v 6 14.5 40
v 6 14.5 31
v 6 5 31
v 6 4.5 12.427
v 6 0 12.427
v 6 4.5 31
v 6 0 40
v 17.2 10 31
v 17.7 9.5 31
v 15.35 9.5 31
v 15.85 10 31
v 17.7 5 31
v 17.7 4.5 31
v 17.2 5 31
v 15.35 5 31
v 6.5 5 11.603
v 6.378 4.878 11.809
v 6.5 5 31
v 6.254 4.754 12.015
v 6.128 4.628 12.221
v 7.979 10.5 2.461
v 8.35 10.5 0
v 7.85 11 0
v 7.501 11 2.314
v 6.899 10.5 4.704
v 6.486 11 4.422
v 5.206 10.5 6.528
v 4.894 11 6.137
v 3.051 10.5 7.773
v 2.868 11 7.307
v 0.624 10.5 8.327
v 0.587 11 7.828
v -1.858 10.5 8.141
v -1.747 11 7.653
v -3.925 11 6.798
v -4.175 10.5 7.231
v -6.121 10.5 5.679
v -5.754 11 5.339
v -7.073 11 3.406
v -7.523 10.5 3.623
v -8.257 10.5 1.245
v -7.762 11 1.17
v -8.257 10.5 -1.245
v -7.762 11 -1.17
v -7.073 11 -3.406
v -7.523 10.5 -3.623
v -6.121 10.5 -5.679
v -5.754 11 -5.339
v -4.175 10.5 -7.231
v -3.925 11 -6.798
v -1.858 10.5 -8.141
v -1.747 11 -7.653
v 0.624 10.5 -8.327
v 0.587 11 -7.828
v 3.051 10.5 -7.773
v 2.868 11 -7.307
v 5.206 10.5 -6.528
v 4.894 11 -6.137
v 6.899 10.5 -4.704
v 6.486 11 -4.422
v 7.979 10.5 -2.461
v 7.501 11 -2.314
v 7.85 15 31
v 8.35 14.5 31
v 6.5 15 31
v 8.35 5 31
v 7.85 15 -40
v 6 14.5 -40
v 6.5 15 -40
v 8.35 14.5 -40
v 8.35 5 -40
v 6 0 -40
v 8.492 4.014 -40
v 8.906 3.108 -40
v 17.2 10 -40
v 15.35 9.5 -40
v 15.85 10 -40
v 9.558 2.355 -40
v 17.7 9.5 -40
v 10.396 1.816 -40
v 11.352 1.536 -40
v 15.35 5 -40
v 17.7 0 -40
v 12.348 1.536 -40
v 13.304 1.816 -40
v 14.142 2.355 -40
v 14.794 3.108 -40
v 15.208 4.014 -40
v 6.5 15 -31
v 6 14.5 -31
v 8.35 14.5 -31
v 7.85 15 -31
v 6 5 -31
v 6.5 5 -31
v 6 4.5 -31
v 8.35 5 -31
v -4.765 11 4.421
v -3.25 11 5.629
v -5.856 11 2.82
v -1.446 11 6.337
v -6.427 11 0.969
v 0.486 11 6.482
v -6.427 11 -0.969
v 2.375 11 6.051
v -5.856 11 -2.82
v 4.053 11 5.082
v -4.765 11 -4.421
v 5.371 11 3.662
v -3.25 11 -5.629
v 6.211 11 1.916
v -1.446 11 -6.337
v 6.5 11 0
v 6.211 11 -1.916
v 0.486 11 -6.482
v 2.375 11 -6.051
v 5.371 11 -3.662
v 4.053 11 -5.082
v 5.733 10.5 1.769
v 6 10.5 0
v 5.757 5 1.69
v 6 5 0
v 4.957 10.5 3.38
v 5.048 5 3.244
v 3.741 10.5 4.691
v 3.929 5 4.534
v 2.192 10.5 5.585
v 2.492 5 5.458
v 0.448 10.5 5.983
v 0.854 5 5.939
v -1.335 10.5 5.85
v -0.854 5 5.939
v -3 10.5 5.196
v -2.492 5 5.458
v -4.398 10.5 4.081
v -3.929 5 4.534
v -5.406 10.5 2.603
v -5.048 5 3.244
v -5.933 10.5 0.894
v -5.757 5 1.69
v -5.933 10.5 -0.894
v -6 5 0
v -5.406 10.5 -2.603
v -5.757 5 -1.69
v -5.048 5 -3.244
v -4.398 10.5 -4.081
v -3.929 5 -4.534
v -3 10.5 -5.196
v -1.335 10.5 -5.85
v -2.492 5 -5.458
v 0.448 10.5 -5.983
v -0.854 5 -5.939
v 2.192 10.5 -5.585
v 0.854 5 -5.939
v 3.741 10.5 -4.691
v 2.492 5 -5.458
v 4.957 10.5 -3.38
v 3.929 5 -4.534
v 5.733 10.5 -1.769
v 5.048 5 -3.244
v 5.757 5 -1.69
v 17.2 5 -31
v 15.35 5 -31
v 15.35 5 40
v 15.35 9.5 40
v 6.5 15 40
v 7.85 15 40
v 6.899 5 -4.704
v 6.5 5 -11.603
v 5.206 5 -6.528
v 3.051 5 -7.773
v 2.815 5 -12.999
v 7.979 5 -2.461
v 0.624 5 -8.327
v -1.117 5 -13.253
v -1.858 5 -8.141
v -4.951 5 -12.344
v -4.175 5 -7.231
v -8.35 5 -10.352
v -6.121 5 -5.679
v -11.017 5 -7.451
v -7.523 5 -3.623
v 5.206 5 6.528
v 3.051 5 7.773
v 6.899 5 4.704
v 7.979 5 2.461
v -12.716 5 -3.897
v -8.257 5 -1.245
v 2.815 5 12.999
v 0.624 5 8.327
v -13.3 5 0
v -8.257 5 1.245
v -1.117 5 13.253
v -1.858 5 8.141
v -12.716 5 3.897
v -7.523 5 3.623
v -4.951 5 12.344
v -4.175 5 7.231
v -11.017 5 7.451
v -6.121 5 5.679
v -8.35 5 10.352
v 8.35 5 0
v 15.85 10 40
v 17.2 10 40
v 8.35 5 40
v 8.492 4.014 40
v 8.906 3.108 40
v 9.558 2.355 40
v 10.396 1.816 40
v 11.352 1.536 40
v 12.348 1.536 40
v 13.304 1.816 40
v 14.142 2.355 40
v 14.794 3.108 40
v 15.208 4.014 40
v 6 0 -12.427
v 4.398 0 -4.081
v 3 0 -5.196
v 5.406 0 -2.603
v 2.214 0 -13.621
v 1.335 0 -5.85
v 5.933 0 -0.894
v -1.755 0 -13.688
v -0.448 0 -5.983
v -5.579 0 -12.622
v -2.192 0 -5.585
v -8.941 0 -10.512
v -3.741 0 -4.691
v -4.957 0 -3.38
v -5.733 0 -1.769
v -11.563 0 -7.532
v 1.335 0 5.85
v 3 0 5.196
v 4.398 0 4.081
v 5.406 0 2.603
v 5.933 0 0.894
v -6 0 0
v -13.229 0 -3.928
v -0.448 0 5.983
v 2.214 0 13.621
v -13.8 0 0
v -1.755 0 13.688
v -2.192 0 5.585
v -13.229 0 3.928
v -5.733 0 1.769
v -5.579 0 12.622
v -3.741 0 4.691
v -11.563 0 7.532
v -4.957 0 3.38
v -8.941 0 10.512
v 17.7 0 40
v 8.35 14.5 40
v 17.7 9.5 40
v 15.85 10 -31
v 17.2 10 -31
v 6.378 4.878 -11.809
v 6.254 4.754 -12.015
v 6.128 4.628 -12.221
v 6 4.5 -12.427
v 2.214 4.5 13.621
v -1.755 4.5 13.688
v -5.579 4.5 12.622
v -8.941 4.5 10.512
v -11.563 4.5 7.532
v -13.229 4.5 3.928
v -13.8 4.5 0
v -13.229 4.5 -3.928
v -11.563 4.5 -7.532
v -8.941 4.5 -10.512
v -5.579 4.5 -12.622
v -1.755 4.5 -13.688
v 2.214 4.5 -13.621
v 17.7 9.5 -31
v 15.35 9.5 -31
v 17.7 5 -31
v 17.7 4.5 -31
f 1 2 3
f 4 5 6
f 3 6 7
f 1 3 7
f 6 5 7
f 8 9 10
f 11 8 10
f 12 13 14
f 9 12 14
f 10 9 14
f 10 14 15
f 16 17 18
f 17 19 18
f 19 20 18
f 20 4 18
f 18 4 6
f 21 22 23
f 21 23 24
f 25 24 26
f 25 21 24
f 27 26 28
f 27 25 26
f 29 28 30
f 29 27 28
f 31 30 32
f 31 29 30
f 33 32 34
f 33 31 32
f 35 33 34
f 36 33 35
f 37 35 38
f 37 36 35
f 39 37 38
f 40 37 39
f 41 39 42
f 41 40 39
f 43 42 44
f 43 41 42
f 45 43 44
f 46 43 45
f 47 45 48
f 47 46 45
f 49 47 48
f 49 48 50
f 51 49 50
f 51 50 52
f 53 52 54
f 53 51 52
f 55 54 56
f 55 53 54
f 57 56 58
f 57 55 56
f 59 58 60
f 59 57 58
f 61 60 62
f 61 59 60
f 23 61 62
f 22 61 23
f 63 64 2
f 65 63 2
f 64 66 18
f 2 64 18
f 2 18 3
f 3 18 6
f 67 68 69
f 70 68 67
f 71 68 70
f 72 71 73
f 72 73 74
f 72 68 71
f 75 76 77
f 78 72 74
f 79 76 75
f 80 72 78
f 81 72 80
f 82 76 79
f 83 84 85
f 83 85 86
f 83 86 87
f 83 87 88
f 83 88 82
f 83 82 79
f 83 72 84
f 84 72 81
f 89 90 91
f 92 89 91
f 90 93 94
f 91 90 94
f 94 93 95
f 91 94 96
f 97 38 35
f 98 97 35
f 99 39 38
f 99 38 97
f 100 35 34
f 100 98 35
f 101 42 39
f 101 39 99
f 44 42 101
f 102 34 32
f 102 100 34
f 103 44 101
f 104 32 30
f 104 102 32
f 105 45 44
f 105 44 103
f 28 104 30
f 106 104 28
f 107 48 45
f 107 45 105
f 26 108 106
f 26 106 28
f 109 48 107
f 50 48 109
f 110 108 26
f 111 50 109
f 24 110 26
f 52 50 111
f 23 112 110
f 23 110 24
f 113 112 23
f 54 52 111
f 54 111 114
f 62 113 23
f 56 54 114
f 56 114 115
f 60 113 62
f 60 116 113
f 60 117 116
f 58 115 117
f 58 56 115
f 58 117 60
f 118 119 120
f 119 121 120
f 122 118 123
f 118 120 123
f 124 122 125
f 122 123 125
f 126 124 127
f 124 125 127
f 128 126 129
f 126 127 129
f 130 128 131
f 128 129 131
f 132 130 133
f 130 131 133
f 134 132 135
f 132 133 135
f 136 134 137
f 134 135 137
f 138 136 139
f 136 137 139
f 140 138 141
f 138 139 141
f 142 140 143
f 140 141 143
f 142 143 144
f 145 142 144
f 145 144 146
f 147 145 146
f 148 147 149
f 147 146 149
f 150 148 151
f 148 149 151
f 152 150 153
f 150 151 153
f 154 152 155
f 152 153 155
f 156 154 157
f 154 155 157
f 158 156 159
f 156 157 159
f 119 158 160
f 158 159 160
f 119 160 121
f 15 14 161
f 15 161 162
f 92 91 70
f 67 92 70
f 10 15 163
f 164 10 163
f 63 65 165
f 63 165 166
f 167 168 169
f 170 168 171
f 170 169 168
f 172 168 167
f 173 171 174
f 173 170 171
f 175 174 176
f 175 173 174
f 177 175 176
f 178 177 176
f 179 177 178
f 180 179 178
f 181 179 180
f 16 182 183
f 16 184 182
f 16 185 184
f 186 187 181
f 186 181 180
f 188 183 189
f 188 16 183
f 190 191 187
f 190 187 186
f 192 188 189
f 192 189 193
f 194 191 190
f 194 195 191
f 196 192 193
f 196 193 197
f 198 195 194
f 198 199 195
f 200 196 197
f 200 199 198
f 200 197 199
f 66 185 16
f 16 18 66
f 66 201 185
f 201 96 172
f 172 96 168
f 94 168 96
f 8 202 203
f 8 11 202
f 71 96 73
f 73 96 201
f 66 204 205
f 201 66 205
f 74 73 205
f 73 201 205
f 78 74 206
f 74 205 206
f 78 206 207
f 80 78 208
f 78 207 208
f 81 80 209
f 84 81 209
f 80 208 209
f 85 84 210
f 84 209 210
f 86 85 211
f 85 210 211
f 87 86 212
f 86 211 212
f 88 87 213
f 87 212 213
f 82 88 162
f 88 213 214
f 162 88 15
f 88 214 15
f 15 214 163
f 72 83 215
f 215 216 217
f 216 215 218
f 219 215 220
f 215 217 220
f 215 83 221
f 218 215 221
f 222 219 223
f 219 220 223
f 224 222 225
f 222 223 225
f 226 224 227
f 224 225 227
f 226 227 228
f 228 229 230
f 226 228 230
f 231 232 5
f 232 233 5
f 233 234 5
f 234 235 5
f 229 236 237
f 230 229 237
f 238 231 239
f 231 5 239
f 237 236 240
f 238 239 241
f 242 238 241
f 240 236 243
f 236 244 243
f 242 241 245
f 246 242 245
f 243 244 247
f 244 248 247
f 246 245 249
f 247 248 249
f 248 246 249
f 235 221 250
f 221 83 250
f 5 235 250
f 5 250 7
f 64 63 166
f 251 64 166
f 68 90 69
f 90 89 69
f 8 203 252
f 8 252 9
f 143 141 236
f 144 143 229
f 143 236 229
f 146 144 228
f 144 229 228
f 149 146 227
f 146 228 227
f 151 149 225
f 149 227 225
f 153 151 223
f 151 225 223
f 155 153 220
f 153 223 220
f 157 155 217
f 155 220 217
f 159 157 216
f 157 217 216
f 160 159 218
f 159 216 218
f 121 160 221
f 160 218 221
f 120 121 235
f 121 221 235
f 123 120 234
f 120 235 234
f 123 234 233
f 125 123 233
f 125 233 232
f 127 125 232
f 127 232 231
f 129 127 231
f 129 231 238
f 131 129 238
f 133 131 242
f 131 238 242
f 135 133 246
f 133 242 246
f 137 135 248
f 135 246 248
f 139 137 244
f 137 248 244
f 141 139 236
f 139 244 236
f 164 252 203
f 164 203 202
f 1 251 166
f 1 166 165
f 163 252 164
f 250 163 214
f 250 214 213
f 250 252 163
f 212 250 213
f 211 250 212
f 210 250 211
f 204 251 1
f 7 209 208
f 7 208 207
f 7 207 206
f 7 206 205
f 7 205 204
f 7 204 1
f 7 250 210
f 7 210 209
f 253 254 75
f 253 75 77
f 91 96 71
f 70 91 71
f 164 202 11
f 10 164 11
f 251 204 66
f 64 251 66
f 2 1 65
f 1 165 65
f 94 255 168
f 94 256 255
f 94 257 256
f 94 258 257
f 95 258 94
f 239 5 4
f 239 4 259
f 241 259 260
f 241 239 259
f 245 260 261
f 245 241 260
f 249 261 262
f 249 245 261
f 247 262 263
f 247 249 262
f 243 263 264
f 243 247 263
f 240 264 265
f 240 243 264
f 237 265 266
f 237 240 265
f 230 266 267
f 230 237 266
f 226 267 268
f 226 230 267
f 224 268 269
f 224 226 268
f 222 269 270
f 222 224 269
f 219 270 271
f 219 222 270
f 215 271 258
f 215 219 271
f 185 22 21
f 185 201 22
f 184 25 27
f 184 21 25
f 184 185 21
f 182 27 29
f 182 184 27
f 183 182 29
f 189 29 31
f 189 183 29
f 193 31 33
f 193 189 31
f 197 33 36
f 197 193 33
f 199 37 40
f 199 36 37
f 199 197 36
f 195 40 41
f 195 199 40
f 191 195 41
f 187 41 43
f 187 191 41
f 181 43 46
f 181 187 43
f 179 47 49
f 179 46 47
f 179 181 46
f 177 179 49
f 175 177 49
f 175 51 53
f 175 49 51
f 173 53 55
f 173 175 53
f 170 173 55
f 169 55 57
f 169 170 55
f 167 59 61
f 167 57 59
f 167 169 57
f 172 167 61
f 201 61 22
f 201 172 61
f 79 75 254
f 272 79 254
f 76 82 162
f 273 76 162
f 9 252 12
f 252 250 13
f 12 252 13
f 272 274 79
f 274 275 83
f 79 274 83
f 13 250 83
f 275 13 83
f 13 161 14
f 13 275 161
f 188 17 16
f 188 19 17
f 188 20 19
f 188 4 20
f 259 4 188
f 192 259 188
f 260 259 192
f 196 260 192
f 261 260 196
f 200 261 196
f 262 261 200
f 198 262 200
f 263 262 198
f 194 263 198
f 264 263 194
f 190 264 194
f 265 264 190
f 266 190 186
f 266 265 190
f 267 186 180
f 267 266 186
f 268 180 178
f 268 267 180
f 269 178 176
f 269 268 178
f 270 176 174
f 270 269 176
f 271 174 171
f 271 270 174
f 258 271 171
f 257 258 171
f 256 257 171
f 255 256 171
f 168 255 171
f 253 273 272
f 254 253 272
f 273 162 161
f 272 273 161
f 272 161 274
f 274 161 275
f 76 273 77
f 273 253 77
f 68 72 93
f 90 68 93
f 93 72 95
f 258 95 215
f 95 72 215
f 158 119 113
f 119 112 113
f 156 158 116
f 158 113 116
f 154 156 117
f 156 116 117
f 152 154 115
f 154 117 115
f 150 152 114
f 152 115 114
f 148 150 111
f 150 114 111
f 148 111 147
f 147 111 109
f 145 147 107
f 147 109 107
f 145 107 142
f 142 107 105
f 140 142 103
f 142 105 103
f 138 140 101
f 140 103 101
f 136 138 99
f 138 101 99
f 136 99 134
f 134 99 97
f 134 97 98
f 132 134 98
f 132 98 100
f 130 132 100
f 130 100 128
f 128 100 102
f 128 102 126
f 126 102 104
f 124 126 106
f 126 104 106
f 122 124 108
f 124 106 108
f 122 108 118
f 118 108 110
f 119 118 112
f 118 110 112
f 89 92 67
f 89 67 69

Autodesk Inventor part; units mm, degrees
ref_plane "YZ Plane" through (0, 0, 0) normal (1, 0, 0) x (0, 1, 0)
ref_plane "XZ Plane" through (0, 0, 0) normal (0, 1, 0) x (-1, 0, 0)
ref_plane "XY Plane" through (0, 0, 0) normal (0, 0, 1) x (1, 0, 0)
sketch "Sketch1" plane through (0, 0, 0) normal (0, 1, 0) x (-1, 0, 0)
  circle A0 centre (0, 0) radius 13.8
  circle A1 centre (0, 0) radius 5
  circle A2 centre (0, 0) radius 6
  dimension "d0" = 27.6
  dimension "d1" = 10
  dimension "d2" = 12
extrude "Extrusion1" add sketch "Sketch1" along normal blind 5 contours A0
sketch "Sketch2" plane through (0, 0, 0) normal (0, -1, 0) x (1, 0, 0)
  circle A0 centre (0, 0) radius 6 projected
  line L0 (6, 0) -> (13.8, 0)
  circle A1 centre (0, 0) radius 13.8 projected
  line L1 (13.8, -40) -> (6, -40)
  line L2 (6, -40) -> (6, 40)
  line L3 (6, 40) -> (13.8, 40)
  line L4 (13.8, 40) -> (13.8, -40)
  line L5 (13.8, -40) -> (6, 40) construction
  line L6 (6, -40) -> (13.8, 40) construction
  line L7 (17.7, 40) -> (9.9, 40)
  line L8 (9.9, 40) -> (9.9, -40)
  line L9 (9.9, -40) -> (17.7, -40)
  line L10 (17.7, -40) -> (17.7, 40)
  line L11 (17.7, 40) -> (9.9, -40) construction
  line L12 (9.9, 40) -> (17.7, -40) construction
  point P0 (9.9, 0)
  point P1 (6, -12.4274)
  point P2 (6, 12.4274)
  dimension "d5" = 80
extrude "Extrusion2" add sketch "Sketch2" against normal blind 5 contours A1 L8 L1 L2 | L2 L3 L8 A1 | L4 L1 L8 A1 | A1 L8 L3 L4 | L4 L7 L10 L9
sketch "Sketch3" plane through (6, 0, 40) normal (0, 0, 1) x (1, 0, 0)
  line L0 (-12, 5) -> (0, 5) projected
  line L1 (7.8, 0) -> (0, 0) projected
  line L2 (0, 5) -> (7.8, 0) construction
  line L3 (0, 5) -> (7.8, 5) construction
  line L4 (0, 0) -> (7.8, 5) construction
  point P0 (-6, 0)
sketch "Sketch4" plane through (6, 0, 40) normal (0, 0, 1) x (1, 0, 0)
  line L0 (0, 0) -> (0, 5) projected
  line L1 (0, 2.5) -> (11.7, 2.5)
  line L2 (11.7, 0) -> (11.7, 5) projected
  line L3 (5.85, 2.5) -> (5.85, 5)
  line L4 (0, 5) -> (11.7, 5) projected
  circle A0 centre (5.85, 5) radius 3.5
  point P0 (-6, 0)
  point P1 (2.35, 5)
  point P2 (9.35, 5)
  dimension "d8" = 7
extrude "Extrusion3" cut sketch "Sketch4" against normal through all contours A0 L4 L3 L1 | L1 A0 | L3 L4 A0 L1
sketch "Sketch5" plane through (0, 5, 0) normal (0, 1, 0) x (1, 0, 0)
  line L0 (17.7, -40) -> (6, -40) projected
  line L1 (8.35, -40) -> (8.35, 40) projected
  line L2 (6, -40) -> (8.35, -40)
  line L3 (8.35, -40) -> (8.35, -31)
  line L4 (8.35, -31) -> (6, -31)
  line L5 (6, -31) -> (6, -40)
  line L6 (15.35, 40) -> (15.35, -40) projected
  line L7 (17.7, -40) -> (17.7, 40) projected
  line L8 (15.35, -40) -> (17.7, -40)
  line L9 (17.7, -40) -> (17.7, -31)
  line L10 (17.7, -31) -> (15.35, -31)
  line L11 (15.35, -31) -> (15.35, -40)
  point P0 (0, 0)
  dimension "d11" = 9
extrude "Extrusion4" add sketch "Sketch5" along normal blind 10 contours L0 L5 L4 L1
extrude "Extrusion5" add sketch "Sketch5" along normal blind 5 contours L0 L6 L10 L7
mirror "Mirror1" about plane through (0, 0, 0) normal (0, 0, 1) of "Extrusion4", "Extrusion5"
sketch "Sketch6" plane through (0, 5, 0) normal (0, 1, 0) x (1, 0, 0)
  circle A0 centre (0, 0) radius 8.35
  circle A1 centre (0, 0) radius 6
extrude "Extrusion6" add sketch "Sketch6" along normal blind 6
chamfer "Chamfer1" distance 0.5 angle 45 14 edges at (-8.35, 11, 0) (-6, 11, 0) (-13.8, 5, 0) (6, 5, -21.7137) (6, 5, 21.7137) (8.35, 15, 35.5) (6, 15, 35.5) (8.35, 15, -35.5) (6, 15, -35.5) (17.7, 10, -35.5) (15.35, 10, -35.5) (17.7, 10, 35.5) (15.35, 10, 35.5) (17.7, 5, 0)
properties part number "ipad holder"
